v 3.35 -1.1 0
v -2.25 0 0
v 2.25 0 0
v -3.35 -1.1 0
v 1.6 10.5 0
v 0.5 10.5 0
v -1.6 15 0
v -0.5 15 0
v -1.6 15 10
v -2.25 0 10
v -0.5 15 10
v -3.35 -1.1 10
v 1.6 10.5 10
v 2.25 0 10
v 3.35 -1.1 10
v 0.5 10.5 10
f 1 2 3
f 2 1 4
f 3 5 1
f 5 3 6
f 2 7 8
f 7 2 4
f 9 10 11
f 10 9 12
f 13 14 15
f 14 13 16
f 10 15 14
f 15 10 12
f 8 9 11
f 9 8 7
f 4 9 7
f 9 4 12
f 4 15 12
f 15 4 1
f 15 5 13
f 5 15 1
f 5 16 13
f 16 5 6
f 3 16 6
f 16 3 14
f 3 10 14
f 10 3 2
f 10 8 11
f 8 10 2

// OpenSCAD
// Tumbler Tag by xifle
// Modified by teejaydub to add an embossed image.

// preview[view:west, tilt:top diagonal]
/* [Global] */

// The maximum glass thickness this tag will work with [mm]
GLASS_MAX = 3.5;

// The minimum glass thickness this tag will work with [mm]
GLASS_MIN = 1;

// The height of the tag [mm]
HEIGHT = 15; //[5:30]

// The width of the tag [mm]
WIDTH = 10; //[5:30]

// Wall thickness [mm]
WALL = 1.1;

// Load a 30x30 pixel image to be embossed onto your tag.  
// Simple shapes with blurry edges work best. 
// Try the Invert Colors checkbox!
image_file = "symbol.dat"; // [image_surface:30x30]

/* [Hidden] */

RADIUS = (WALL-0.1)/2;

ANGLE = atan2(GLASS_MAX/2, HEIGHT);

SYMBOL_WIDTH = WIDTH * 0.8;

difference() {
	linear_extrude(height=WIDTH) {
		union() {
			halfed_outline(GLASS_MAX, GLASS_MIN, HEIGHT*0.7, RADIUS, WALL);
			mirror([1,0,0]) {
				halfed_outline(GLASS_MAX, GLASS_MIN, HEIGHT, RADIUS, WALL);
			}
		}
	}
	translate([-GLASS_MAX/2-WALL, HEIGHT/2, WIDTH/2])
		rotate([90-ANGLE, -90, 90])
//			resize([SYMBOL_WIDTH, SYMBOL_WIDTH, 0])  // not supported by Customizer
//				scale([1, 1, WALL]) 
			scale([SYMBOL_WIDTH/30, SYMBOL_WIDTH/30, WALL]) 
				surface(file=image_file, center=true, convexity=5); 
}

module halfed_outline(max, min, height, radius, wall) {
	polygon(points=[[0,0],[max/2+radius,0],[min/2,height],[min/2+wall,height], 
		[max/2+radius+wall,-wall], [0,-wall]], paths=[[0,1,2,3,4,5]]);
}
